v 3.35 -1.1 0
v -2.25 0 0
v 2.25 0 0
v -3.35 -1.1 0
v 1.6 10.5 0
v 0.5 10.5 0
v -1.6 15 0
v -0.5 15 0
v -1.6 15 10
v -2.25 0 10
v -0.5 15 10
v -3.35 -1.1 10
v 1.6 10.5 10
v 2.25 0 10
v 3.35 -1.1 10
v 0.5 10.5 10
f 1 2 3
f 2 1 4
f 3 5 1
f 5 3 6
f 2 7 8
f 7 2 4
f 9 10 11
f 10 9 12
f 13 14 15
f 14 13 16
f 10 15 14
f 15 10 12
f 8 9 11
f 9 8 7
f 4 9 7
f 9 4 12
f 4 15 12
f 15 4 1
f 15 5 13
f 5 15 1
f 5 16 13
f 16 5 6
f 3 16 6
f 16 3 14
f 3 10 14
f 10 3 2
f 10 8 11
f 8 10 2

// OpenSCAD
// Tumbler Tag by xifle
// Modified by teejaydub to add an embossed image.

// preview[view:west, tilt:top diagonal]
/* [Global] */

// The maximum glass thickness this tag will work with [mm]
GLASS_MAX = 3.5;

// The minimum glass thickness this tag will work with [mm]
GLASS_MIN = 1;

// The height of the tag [mm]
HEIGHT = 15; //[5:30]

// The width of the tag [mm]
WIDTH = 10; //[5:30]

// Wall thickness [mm]
WALL = 1.1;

// Load a 30x30 pixel image to be embossed onto your tag.  
// Simple shapes with blurry edges work best. 
// Try the Invert Colors checkbox!
image_file = "symbol.dat"; // [image_surface:30x30]

/* [Hidden] */

RADIUS = (WALL-0.1)/2;

ANGLE = atan2(GLASS_MAX/2, HEIGHT);

SYMBOL_WIDTH = WIDTH * 0.8;

difference() {
	linear_extrude(height=WIDTH) {
		union() {
			halfed_outline(GLASS_MAX, GLASS_MIN, HEIGHT*0.7, RADIUS, WALL);
			mirror([1,0,0]) {
				halfed_outline(GLASS_MAX, GLASS_MIN, HEIGHT, RADIUS, WALL);
			}
		}
	}
	translate([-GLASS_MAX/2-WALL, HEIGHT/2, WIDTH/2])
		rotate([90-ANGLE, -90, 90])
//			resize([SYMBOL_WIDTH, SYMBOL_WIDTH, 0])  // not supported by Customizer
//				scale([1, 1, WALL]) 
			scale([SYMBOL_WIDTH/30, SYMBOL_WIDTH/30, WALL]) 
				surface(file=image_file, center=true, convexity=5); 
}

module halfed_outline(max, min, height, radius, wall) {
	polygon(points=[[0,0],[max/2+radius,0],[min/2,height],[min/2+wall,height], 
		[max/2+radius+wall,-wall], [0,-wall]], paths=[[0,1,2,3,4,5]]);
}
